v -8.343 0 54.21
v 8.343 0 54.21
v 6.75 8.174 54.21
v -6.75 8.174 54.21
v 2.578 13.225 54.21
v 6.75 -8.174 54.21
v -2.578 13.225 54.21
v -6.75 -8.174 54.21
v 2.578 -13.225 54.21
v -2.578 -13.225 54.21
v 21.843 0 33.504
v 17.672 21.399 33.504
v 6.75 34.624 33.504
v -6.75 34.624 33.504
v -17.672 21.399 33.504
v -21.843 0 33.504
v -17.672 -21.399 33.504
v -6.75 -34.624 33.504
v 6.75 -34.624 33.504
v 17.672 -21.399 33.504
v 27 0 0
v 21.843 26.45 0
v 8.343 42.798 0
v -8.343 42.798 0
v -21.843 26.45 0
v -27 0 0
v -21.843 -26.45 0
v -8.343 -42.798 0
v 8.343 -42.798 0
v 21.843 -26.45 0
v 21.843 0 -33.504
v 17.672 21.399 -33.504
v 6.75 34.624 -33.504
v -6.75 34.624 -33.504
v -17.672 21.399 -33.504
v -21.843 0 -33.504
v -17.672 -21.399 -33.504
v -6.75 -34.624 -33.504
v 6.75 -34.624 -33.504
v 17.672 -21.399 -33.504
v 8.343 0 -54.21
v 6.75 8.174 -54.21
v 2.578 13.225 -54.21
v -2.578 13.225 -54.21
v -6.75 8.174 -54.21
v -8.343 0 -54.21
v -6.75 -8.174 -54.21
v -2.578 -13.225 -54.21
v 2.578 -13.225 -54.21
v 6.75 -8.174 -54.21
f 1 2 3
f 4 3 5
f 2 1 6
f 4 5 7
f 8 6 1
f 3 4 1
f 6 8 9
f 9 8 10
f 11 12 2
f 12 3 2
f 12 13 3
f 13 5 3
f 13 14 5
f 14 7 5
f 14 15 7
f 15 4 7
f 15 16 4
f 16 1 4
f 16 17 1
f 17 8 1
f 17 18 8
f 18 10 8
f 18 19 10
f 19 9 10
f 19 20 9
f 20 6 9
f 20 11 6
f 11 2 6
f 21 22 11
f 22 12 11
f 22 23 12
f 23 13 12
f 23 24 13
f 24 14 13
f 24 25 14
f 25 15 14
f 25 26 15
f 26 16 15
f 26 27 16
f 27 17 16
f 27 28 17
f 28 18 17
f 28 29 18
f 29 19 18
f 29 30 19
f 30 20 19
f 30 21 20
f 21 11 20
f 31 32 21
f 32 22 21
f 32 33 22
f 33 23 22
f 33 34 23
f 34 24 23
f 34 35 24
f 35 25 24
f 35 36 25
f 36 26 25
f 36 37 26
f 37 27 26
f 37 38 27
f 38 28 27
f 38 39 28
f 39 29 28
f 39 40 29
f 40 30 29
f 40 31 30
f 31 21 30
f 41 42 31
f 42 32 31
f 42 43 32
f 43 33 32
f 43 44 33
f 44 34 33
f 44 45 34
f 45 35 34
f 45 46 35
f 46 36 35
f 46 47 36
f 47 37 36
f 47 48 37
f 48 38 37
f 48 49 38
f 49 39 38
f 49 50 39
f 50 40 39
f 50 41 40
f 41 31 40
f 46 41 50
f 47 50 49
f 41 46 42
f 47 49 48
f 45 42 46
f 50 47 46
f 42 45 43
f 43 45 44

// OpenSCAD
// Generated by SolidPython 1.0.1 on 2020-07-29 00:46:49


scale(v = [9, 15, 19]) {
	sphere(r = 3);
}
/***********************************************
*********      SolidPython code:      **********
************************************************
 
# import packages: SolidPython
from solid import *
from solid.utils import *
from itertools import chain, combinations, permutations


class Resize:

    def __init__(self, scad_file):
        self.scad_file = scad_file
        #self.scad_file = import_scad(scad_file)
        # cone/cylinder param:
        self.r1 = 0
        self.r2 = 0
        self.h = 0
        # rectangular prism param:
        self.w = 0
        self.l = 0
        # ellipse param:
        self.r = 0

    # import OpenScad code (file name corresponds to shape)


    # classify shape + parameters
    def assign(self, param1, param2, param3):
        if self.scad_file == 'cone.scad':
            self.r1 = param1
            self.r2 = param2
            self.h = param3
        elif self.scad_file == 'cylinder.scad':
            self.r1 = param1
            self.r2 = param2
            self.h = param3
        elif self.scad_file == 'rectangularPrism.scad':
            self.h = param1
            self.l = param2
            self.w = param3
        else:
            self.r = param1
            self.h = param2

    # resize parameters
    def iterate(self):
        x = range(3, 20, 2)
        i = 1
        if self.scad_file == 'cone.scad':
            tempList = list(permutations(x, 2))
            for temp in tempList:
                param1 = temp[0]
                param2 = temp[1]
                filepath = 'produced_scad_files/' + 'cone' + str(param1) + '_' + str(param2) + '_' + '.scad'
                scad_render_to_file(cylinder(h=param1, r1=param2, r2=0), filepath)

        elif self.scad_file == 'cylinder.scad':
            tempList = list(permutations(x, 3))
            for temp in tempList:
                param1 = temp[0]
                param2 = temp[1]
                filepath = 'produced_scad_files/' + 'cylinder' + str(param1) + '_' + str(param2) + '_' + '.scad'
                scad_render_to_file(cylinder(h=param1, r1=param2, r2=param2), filepath)

        elif self.scad_file == 'rectangularPrism.scad':
            tempList = list(permutations(x, 3))
            for temp in tempList:
                param1 = temp[0]
                param2 = temp[1]
                param3 = temp[2]
                filepath = 'produced_scad_files/' + 'rectangularPrism' + str(param1) + '_' + str(param2) + '_' + str(
                    param3) + '.scad'
                scad_render_to_file(cube(size=(param1, param2, param3)), filepath)

        elif self.scad_file == 'ellipse.scad':
            tempList = list(permutations(x, 4))
            for temp in tempList:
                param1 = temp[0]
                param2 = temp[1]
                param3 = temp[2]
                param4 = temp[3]
                filepath = 'produced_scad_files/' + 'ellipse' + str(param1) + '_' + str(param2) + '_' + str(param3) + '_' + str(param4) + '.scad'
                scad_render_to_file(scale([param1, param2, param3])(sphere(r=param4)), filepath)

    def render_to_scadfile(self):
        scad_render_to_file(scad, 'example.scad') 
 
************************************************/
